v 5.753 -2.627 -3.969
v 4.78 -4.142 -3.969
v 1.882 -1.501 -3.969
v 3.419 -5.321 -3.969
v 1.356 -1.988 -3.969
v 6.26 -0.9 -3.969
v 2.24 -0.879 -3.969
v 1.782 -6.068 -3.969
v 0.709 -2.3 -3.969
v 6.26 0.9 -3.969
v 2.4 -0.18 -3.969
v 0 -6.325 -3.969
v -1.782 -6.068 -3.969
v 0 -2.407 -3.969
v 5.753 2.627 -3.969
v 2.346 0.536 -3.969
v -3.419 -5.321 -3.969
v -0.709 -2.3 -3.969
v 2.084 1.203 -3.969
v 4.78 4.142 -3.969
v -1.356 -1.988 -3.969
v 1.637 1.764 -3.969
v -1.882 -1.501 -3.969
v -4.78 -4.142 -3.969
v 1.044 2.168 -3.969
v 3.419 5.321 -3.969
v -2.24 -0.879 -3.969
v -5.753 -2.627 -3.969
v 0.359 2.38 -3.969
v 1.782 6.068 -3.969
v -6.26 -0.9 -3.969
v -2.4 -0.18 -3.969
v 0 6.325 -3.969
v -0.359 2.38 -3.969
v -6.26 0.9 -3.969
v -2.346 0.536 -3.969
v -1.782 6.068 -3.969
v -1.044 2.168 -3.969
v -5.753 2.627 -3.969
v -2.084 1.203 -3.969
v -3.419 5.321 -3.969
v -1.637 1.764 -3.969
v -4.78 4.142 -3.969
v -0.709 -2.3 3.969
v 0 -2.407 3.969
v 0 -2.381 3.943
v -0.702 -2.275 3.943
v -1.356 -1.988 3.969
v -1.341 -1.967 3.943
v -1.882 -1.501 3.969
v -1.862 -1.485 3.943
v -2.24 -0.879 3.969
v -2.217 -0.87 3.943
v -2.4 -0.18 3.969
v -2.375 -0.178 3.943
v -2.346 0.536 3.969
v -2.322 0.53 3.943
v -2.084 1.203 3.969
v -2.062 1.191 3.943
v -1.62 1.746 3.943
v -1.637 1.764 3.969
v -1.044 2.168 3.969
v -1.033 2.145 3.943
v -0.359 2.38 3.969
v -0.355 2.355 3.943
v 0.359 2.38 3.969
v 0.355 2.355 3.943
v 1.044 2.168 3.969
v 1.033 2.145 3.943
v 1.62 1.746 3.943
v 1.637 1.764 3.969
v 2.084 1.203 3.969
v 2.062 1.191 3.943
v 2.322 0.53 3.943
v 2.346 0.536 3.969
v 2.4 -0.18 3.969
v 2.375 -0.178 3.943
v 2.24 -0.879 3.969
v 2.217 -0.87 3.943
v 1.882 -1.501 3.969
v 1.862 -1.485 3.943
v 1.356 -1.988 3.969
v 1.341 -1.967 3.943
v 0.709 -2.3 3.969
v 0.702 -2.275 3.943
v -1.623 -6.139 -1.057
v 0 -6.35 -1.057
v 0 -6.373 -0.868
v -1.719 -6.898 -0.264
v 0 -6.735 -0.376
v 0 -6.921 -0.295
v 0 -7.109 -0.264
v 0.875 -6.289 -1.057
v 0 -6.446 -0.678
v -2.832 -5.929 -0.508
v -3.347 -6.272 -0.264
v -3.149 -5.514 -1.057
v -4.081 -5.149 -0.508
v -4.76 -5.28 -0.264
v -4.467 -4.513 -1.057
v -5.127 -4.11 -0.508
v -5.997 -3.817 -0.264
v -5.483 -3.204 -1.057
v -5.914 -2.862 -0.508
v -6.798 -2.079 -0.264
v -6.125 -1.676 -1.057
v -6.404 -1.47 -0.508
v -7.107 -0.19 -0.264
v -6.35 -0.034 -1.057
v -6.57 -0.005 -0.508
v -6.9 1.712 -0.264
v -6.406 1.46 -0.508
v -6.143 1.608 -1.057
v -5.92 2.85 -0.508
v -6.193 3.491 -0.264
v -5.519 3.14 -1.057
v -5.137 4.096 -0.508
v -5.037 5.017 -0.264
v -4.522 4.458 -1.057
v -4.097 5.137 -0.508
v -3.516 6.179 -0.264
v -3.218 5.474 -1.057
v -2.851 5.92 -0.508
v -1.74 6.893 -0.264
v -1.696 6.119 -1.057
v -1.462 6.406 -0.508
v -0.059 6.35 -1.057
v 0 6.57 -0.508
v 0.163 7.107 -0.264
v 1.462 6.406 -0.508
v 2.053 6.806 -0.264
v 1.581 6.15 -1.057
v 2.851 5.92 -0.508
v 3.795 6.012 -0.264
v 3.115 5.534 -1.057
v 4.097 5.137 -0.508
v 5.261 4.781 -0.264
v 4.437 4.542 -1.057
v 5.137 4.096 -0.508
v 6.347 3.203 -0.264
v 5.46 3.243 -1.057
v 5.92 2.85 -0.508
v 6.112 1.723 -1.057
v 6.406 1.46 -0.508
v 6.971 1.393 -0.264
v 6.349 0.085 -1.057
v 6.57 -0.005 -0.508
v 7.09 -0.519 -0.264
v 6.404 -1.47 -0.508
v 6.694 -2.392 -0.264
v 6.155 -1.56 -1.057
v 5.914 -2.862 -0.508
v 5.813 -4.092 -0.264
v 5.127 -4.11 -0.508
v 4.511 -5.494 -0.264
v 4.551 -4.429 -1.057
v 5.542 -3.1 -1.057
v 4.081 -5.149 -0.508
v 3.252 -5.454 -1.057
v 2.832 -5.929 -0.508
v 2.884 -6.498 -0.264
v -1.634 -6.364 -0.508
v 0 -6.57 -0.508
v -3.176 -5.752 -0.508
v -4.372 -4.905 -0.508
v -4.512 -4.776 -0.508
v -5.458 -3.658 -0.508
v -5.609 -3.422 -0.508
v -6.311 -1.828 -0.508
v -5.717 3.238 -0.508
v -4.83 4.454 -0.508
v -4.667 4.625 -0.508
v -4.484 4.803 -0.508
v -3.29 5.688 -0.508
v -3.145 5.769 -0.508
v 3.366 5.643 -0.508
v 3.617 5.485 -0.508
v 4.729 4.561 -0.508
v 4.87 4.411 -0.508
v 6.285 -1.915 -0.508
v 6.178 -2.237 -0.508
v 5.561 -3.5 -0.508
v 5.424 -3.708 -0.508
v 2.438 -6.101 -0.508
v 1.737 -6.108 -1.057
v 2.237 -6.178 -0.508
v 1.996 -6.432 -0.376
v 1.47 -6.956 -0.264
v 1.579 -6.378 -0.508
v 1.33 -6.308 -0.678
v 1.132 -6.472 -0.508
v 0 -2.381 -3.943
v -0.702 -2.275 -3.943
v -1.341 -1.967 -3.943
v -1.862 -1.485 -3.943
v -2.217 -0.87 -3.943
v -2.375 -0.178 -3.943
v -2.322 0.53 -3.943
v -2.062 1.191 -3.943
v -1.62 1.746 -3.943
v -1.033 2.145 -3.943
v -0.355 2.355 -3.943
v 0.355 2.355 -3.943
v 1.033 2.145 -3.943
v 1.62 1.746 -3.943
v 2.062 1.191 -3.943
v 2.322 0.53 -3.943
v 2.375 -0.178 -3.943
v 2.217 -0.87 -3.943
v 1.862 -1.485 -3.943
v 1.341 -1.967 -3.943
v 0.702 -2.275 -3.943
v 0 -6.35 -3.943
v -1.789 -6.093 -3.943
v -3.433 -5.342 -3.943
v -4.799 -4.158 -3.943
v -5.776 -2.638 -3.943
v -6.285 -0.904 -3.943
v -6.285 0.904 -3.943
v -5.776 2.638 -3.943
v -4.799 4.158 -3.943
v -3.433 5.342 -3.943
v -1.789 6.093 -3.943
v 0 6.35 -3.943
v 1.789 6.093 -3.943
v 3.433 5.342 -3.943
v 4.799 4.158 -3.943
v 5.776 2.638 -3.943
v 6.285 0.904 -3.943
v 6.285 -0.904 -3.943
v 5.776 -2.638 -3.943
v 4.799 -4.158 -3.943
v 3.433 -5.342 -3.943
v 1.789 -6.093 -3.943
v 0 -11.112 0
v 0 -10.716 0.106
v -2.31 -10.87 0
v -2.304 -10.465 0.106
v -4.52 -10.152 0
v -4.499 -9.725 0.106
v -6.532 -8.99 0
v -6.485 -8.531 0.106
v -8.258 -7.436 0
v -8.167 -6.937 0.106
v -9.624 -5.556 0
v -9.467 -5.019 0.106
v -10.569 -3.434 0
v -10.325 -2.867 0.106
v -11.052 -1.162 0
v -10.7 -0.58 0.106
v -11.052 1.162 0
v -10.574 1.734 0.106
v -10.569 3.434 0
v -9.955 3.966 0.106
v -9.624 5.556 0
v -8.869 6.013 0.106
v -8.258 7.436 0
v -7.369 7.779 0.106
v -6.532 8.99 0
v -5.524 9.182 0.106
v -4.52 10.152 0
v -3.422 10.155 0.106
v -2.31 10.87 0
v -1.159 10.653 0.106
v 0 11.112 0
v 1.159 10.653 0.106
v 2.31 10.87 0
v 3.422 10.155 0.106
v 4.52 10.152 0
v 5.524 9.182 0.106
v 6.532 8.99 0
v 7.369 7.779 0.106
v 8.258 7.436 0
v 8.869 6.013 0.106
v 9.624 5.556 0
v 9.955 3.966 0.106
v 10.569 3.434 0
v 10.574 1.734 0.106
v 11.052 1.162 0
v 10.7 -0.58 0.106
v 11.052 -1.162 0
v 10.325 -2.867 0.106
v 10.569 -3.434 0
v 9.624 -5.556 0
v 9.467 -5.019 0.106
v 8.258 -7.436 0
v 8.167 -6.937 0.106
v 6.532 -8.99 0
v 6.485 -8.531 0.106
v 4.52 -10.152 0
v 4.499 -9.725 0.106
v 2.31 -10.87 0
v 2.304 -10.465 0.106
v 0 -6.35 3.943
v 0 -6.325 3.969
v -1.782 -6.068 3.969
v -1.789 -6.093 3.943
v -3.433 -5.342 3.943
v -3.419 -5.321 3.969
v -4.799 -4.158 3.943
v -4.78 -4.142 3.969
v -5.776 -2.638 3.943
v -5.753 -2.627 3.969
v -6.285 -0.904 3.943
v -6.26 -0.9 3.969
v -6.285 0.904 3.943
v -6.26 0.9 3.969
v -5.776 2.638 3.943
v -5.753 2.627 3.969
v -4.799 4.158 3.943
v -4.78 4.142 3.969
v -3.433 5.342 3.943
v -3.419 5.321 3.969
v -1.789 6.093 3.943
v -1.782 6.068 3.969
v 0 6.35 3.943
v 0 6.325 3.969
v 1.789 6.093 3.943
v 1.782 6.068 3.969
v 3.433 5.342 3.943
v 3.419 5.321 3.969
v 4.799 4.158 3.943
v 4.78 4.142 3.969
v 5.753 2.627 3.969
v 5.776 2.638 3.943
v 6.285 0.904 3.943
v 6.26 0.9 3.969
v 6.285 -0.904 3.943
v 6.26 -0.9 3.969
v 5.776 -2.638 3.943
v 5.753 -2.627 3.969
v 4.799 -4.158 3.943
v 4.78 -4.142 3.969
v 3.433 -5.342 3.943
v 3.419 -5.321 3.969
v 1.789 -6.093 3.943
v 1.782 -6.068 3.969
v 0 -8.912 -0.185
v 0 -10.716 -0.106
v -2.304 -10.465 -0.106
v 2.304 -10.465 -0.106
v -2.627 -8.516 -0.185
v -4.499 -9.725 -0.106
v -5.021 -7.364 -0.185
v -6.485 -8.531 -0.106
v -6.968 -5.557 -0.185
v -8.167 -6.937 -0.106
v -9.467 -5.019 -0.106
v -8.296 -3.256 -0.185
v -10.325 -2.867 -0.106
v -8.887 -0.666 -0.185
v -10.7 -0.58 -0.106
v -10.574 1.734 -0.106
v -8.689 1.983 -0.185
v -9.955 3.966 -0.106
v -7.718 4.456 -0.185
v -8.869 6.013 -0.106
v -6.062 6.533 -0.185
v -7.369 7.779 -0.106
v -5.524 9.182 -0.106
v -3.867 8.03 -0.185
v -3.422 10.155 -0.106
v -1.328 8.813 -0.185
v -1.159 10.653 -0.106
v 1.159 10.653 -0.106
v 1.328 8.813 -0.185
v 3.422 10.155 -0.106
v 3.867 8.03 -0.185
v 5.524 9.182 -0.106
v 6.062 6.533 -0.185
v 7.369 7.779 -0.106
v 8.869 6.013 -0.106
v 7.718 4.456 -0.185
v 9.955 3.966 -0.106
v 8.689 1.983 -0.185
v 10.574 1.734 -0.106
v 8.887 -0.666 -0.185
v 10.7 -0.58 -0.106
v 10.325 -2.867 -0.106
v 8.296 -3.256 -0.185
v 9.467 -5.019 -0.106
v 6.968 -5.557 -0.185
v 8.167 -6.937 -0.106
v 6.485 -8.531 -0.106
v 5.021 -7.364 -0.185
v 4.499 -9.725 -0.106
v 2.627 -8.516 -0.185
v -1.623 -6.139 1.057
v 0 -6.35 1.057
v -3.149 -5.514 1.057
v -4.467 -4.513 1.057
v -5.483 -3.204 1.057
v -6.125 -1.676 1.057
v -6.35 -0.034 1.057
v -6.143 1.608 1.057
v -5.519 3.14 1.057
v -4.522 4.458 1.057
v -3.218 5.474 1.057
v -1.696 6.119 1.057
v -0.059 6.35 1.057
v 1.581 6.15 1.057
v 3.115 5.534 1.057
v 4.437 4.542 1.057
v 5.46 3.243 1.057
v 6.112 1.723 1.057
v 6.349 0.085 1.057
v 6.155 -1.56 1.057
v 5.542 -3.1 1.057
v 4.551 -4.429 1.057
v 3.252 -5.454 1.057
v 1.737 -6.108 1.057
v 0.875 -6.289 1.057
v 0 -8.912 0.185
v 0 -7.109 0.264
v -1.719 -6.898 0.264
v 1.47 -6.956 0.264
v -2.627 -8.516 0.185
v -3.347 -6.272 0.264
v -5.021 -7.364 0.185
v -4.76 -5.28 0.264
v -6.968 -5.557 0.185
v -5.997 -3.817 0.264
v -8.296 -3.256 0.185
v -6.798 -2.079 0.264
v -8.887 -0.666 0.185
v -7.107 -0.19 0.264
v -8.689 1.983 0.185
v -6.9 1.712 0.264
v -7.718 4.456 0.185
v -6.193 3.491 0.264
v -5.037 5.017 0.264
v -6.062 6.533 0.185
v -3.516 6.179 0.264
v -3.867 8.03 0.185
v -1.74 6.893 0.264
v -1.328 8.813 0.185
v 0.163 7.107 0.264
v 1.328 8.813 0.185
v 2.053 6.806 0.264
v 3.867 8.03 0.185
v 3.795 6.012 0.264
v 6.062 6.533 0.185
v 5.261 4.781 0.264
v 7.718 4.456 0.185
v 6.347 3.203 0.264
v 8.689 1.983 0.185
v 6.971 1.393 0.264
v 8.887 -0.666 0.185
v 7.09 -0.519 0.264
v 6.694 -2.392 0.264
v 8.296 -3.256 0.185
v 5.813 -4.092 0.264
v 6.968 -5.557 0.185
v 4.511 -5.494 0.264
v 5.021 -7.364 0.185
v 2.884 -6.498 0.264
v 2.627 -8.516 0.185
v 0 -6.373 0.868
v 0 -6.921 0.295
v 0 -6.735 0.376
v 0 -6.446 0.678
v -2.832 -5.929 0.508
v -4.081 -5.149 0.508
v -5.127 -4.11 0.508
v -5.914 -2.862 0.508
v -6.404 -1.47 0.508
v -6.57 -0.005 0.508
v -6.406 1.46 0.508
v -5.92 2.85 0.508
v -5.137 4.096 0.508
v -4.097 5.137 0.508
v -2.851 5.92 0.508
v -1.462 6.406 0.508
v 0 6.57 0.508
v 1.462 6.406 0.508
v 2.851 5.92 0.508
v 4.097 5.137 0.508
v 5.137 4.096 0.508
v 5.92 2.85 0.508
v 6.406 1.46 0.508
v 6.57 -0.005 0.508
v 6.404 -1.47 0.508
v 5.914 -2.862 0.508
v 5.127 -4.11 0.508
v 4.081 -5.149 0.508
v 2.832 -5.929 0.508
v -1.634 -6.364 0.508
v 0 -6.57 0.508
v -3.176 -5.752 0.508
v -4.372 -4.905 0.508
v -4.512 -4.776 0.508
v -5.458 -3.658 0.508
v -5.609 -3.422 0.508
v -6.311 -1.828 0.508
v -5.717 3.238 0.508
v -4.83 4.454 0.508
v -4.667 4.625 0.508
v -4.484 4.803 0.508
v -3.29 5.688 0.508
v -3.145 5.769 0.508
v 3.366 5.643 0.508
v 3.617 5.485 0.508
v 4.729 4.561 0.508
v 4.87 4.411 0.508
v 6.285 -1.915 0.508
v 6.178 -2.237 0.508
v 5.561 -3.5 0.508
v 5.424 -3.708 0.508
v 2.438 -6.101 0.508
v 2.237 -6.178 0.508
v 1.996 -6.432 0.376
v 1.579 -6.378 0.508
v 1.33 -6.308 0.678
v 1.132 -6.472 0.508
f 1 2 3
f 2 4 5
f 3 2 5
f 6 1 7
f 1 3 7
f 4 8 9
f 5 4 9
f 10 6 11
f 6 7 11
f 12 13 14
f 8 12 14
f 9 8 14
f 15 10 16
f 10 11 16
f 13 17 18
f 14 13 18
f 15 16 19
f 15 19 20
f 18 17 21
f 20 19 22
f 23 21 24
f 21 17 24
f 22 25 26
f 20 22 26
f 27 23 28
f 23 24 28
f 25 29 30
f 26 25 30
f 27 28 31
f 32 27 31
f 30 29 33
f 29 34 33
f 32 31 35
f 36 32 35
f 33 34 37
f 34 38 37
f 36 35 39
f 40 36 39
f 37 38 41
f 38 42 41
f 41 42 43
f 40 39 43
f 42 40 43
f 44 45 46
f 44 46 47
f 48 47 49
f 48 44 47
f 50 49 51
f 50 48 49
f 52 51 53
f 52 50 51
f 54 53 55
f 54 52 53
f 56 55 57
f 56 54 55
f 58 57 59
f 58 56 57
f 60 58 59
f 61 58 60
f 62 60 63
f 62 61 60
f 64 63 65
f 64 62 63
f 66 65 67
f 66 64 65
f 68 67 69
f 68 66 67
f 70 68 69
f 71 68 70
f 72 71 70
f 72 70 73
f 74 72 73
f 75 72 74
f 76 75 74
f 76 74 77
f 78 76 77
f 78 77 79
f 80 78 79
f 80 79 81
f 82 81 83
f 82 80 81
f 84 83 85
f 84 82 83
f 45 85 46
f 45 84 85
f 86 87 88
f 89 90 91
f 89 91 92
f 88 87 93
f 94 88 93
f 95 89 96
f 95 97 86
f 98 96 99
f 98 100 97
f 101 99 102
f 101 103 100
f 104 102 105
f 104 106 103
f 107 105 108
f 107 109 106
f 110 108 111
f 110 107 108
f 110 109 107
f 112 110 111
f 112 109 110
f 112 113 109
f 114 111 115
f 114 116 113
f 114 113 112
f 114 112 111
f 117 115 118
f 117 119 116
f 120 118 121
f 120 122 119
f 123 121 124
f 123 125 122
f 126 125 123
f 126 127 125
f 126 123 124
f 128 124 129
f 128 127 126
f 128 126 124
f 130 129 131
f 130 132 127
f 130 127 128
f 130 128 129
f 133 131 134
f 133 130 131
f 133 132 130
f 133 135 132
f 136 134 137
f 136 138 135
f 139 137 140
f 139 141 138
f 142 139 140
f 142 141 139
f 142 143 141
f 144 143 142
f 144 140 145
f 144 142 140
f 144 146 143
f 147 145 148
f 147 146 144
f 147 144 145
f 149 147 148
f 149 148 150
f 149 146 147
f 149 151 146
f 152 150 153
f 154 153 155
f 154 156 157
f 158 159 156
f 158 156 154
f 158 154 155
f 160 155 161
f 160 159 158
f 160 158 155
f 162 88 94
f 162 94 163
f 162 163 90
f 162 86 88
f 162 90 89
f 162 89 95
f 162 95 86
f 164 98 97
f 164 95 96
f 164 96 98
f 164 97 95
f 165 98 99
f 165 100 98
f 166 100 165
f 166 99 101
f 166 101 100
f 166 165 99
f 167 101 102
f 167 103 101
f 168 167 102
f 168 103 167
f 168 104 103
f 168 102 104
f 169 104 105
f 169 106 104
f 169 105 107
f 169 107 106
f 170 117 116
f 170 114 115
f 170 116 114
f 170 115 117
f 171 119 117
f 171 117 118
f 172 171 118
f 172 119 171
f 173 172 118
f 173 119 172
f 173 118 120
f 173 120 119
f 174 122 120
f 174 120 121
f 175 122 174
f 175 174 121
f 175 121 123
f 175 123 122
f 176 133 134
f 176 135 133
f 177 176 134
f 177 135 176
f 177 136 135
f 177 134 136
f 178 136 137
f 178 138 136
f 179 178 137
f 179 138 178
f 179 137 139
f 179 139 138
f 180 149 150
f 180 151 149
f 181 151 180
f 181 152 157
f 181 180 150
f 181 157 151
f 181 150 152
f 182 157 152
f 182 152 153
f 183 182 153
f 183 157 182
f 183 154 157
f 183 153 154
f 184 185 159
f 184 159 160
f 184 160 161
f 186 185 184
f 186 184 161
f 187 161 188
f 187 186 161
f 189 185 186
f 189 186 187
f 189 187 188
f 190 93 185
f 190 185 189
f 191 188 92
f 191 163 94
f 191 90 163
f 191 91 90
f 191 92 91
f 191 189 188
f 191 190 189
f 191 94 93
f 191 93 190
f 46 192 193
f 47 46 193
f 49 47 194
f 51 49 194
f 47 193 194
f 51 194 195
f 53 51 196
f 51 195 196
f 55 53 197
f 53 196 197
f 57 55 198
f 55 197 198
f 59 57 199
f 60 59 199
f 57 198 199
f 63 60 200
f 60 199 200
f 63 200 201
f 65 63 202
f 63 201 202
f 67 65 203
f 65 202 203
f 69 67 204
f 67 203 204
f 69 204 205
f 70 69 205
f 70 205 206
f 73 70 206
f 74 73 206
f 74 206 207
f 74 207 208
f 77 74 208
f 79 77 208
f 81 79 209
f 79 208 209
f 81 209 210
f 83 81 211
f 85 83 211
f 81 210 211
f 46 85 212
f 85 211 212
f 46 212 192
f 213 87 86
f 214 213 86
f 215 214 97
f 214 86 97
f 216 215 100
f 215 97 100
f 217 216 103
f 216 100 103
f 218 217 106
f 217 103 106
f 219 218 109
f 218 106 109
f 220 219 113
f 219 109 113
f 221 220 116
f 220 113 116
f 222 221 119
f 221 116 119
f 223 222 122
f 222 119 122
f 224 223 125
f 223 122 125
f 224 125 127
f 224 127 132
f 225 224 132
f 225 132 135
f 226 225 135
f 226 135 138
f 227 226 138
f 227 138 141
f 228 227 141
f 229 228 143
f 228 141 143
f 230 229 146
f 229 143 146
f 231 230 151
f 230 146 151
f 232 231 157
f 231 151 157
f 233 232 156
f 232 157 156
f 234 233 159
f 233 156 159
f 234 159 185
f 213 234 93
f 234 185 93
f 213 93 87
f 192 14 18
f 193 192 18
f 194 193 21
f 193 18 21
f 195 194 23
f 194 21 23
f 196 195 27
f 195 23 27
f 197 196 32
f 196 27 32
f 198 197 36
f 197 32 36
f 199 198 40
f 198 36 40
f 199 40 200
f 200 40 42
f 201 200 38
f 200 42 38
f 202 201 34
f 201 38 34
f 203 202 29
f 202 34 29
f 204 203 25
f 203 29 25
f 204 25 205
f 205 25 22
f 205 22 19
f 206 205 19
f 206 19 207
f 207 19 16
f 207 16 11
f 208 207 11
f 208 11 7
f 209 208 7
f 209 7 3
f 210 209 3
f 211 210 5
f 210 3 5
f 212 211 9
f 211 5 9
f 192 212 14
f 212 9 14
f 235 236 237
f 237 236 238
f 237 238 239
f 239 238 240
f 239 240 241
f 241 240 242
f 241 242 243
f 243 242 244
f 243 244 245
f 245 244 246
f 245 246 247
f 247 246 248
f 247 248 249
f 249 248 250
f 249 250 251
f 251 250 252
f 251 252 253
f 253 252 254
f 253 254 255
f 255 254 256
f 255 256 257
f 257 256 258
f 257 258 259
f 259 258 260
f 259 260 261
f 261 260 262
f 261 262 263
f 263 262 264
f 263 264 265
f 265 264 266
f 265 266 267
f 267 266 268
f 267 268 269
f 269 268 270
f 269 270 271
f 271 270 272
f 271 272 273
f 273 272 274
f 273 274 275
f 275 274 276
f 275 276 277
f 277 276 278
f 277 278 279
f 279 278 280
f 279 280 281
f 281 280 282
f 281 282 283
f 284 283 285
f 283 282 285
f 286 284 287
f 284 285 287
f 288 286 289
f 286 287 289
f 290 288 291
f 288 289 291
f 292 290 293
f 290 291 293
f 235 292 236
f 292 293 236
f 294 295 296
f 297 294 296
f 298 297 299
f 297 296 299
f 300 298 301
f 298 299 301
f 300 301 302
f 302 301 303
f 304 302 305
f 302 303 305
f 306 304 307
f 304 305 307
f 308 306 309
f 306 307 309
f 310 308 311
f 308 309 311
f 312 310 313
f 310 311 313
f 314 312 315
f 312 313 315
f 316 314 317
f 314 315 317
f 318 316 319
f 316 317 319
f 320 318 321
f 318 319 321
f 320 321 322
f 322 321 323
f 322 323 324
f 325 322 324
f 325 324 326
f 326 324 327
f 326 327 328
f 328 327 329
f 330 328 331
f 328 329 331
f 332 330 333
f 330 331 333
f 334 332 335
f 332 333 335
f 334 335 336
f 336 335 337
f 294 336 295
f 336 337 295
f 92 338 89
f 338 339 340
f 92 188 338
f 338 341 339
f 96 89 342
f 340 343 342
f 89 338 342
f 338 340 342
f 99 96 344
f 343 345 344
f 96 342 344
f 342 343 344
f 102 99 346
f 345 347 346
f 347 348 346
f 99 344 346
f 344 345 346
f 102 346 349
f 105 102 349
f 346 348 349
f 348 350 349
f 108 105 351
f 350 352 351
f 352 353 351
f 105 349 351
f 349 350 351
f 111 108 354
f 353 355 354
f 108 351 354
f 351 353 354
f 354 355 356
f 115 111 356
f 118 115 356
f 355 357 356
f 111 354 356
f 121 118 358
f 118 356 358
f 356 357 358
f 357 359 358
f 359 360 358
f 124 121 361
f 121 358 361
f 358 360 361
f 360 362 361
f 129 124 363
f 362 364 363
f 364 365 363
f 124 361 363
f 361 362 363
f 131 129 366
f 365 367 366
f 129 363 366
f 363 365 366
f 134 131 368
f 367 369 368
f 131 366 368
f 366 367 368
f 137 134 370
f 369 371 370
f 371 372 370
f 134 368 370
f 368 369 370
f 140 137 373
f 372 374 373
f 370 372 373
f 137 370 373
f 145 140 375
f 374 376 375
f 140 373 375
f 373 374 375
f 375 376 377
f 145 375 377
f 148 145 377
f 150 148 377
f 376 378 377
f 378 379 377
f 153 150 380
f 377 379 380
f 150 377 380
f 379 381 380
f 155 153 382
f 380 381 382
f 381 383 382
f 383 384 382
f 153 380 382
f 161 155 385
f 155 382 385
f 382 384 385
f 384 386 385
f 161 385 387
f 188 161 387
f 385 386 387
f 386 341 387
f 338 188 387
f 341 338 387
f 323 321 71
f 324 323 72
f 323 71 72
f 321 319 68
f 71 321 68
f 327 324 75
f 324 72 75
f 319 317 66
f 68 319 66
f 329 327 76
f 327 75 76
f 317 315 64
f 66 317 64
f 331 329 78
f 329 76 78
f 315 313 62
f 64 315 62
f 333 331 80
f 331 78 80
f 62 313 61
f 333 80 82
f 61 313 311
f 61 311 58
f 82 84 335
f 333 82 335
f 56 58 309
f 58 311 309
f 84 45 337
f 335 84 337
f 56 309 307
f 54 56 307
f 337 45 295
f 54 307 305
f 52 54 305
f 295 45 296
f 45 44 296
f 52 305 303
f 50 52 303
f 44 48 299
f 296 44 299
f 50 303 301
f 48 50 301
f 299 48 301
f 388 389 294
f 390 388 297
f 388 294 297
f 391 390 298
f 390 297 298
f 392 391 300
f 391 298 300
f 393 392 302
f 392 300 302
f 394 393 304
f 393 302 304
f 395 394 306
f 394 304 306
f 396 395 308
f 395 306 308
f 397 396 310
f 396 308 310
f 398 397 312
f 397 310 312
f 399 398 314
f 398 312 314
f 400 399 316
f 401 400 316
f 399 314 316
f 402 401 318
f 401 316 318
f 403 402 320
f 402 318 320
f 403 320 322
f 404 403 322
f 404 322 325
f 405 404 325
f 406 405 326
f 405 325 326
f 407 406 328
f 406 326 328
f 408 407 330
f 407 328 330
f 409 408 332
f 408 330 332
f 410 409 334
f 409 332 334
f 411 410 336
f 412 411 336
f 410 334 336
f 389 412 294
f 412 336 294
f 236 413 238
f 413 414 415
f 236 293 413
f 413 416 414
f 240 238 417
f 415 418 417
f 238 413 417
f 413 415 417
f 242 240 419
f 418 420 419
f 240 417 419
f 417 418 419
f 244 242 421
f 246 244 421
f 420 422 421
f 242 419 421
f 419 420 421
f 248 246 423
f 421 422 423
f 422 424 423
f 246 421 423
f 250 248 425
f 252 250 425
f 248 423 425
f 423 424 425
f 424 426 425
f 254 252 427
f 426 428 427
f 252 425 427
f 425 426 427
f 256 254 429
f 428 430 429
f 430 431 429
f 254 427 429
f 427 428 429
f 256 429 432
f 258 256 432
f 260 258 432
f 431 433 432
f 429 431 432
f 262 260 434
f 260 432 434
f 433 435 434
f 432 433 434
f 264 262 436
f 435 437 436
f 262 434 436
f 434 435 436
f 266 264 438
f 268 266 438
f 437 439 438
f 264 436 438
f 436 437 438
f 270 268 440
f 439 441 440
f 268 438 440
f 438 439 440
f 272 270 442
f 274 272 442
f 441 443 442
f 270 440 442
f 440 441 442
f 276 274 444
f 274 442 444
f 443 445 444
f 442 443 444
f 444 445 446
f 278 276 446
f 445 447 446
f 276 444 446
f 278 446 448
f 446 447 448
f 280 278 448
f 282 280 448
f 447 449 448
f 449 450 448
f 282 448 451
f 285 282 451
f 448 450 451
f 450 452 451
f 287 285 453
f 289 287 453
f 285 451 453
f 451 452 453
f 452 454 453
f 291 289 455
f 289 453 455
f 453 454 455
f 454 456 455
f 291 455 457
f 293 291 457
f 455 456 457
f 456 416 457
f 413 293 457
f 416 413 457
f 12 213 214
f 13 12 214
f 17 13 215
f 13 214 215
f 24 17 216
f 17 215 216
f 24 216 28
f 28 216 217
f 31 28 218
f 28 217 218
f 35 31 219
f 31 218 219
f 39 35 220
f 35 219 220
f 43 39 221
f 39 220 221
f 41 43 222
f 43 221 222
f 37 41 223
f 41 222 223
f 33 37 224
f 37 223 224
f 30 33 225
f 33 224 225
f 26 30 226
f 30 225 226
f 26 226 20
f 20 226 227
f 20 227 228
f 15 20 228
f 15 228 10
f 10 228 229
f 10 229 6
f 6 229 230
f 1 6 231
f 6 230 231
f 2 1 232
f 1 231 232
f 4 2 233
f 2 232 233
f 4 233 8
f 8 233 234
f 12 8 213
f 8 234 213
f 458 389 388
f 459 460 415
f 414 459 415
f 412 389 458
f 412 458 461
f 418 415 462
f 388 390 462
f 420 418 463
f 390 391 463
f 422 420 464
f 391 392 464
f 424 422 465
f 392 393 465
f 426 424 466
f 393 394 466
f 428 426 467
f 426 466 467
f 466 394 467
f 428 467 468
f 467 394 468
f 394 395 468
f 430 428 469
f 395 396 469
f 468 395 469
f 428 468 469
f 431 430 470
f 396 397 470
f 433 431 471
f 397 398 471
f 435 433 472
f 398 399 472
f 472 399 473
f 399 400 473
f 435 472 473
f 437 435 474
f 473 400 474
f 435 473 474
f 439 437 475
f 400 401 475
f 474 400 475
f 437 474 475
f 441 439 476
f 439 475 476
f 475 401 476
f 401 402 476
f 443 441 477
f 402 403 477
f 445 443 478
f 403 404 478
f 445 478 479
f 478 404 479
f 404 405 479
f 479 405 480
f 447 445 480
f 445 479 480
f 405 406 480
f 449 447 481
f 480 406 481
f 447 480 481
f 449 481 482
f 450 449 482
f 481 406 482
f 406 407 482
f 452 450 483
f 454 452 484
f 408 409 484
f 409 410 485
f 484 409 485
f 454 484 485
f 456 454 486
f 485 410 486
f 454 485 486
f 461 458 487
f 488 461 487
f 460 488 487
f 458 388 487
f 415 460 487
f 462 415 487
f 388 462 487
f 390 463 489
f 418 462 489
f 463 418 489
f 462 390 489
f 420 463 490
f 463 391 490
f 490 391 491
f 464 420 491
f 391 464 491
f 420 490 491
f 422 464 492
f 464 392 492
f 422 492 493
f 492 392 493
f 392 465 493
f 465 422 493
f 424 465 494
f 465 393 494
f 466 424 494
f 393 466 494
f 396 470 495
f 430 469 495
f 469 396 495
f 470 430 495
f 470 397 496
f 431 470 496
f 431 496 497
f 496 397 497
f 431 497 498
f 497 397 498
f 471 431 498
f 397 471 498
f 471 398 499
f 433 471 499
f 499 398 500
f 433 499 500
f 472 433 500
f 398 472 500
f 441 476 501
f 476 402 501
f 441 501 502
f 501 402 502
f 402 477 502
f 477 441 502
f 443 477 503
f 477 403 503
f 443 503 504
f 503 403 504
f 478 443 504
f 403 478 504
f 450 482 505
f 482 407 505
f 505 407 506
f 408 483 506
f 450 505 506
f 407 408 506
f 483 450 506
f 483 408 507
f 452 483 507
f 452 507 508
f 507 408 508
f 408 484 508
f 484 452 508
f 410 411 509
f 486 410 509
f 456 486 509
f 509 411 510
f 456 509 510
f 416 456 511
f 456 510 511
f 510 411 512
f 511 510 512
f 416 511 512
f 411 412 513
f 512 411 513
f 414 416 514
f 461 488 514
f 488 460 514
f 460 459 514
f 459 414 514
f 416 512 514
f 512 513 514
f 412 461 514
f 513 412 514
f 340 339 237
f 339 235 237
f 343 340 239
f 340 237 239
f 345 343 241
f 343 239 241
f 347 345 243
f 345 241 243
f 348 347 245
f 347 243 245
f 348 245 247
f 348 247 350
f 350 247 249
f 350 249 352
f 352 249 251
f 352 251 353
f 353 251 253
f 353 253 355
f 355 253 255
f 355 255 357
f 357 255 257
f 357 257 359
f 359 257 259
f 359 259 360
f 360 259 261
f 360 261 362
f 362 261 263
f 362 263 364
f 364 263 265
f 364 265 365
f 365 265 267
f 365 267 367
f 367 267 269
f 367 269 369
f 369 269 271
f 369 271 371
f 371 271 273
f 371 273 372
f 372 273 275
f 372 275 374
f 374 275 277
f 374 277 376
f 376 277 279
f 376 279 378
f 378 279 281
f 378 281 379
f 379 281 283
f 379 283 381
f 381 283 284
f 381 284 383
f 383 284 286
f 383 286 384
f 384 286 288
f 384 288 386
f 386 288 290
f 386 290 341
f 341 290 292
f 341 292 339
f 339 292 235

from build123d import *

# Parameters (mm, degrees)
CHAMFER1_SIZE = 0.0254
FILLET1_R     = 0.79375


with BuildPart() as part:
    # Sketch3 → Revolve1 (revolve)
    with BuildSketch(Plane(origin=(0, 0, 0), x_dir=(0, 0, -1), z_dir=(1, 0, 0)), mode=Mode.PRIVATE) as revolve1_sk:
        Polygon((-3.96875, 2.38125), (3.96875, 2.38125), (3.96875, 6.35), (0.29694964, 6.35), (0.106342336, 10.715625), (0, 11.1125), (-0.106342336, 10.715625), (-0.29694964, 6.35), (-3.96875, 6.35), align=None)
    revolve(revolve1_sk.sketch.rotate(Axis((0, 0, 3.96875), (0, 0, -1)), 180), axis=Axis((0, 0, 3.96875), (0, 0, -1)))

    # Chamfer1
    chamfer1_edges = [part.edges().sort_by_distance(p)[0] for p in [
        (0, 2.38125, 3.96875),
        (0, 6.35, 3.96875),
        (0, 6.35, -3.96875),
        (0, 2.38125, -3.96875),
    ]]
    chamfer(chamfer1_edges, length=CHAMFER1_SIZE)

    # Fillet1
    fillet1_edges = [part.edges().sort_by_distance(p)[0] for p in [
        (0, 6.35, 0.29694964),
        (0, 6.35, -0.29694964),
    ]]
    fillet(fillet1_edges, radius=FILLET1_R)


solid = part.part
